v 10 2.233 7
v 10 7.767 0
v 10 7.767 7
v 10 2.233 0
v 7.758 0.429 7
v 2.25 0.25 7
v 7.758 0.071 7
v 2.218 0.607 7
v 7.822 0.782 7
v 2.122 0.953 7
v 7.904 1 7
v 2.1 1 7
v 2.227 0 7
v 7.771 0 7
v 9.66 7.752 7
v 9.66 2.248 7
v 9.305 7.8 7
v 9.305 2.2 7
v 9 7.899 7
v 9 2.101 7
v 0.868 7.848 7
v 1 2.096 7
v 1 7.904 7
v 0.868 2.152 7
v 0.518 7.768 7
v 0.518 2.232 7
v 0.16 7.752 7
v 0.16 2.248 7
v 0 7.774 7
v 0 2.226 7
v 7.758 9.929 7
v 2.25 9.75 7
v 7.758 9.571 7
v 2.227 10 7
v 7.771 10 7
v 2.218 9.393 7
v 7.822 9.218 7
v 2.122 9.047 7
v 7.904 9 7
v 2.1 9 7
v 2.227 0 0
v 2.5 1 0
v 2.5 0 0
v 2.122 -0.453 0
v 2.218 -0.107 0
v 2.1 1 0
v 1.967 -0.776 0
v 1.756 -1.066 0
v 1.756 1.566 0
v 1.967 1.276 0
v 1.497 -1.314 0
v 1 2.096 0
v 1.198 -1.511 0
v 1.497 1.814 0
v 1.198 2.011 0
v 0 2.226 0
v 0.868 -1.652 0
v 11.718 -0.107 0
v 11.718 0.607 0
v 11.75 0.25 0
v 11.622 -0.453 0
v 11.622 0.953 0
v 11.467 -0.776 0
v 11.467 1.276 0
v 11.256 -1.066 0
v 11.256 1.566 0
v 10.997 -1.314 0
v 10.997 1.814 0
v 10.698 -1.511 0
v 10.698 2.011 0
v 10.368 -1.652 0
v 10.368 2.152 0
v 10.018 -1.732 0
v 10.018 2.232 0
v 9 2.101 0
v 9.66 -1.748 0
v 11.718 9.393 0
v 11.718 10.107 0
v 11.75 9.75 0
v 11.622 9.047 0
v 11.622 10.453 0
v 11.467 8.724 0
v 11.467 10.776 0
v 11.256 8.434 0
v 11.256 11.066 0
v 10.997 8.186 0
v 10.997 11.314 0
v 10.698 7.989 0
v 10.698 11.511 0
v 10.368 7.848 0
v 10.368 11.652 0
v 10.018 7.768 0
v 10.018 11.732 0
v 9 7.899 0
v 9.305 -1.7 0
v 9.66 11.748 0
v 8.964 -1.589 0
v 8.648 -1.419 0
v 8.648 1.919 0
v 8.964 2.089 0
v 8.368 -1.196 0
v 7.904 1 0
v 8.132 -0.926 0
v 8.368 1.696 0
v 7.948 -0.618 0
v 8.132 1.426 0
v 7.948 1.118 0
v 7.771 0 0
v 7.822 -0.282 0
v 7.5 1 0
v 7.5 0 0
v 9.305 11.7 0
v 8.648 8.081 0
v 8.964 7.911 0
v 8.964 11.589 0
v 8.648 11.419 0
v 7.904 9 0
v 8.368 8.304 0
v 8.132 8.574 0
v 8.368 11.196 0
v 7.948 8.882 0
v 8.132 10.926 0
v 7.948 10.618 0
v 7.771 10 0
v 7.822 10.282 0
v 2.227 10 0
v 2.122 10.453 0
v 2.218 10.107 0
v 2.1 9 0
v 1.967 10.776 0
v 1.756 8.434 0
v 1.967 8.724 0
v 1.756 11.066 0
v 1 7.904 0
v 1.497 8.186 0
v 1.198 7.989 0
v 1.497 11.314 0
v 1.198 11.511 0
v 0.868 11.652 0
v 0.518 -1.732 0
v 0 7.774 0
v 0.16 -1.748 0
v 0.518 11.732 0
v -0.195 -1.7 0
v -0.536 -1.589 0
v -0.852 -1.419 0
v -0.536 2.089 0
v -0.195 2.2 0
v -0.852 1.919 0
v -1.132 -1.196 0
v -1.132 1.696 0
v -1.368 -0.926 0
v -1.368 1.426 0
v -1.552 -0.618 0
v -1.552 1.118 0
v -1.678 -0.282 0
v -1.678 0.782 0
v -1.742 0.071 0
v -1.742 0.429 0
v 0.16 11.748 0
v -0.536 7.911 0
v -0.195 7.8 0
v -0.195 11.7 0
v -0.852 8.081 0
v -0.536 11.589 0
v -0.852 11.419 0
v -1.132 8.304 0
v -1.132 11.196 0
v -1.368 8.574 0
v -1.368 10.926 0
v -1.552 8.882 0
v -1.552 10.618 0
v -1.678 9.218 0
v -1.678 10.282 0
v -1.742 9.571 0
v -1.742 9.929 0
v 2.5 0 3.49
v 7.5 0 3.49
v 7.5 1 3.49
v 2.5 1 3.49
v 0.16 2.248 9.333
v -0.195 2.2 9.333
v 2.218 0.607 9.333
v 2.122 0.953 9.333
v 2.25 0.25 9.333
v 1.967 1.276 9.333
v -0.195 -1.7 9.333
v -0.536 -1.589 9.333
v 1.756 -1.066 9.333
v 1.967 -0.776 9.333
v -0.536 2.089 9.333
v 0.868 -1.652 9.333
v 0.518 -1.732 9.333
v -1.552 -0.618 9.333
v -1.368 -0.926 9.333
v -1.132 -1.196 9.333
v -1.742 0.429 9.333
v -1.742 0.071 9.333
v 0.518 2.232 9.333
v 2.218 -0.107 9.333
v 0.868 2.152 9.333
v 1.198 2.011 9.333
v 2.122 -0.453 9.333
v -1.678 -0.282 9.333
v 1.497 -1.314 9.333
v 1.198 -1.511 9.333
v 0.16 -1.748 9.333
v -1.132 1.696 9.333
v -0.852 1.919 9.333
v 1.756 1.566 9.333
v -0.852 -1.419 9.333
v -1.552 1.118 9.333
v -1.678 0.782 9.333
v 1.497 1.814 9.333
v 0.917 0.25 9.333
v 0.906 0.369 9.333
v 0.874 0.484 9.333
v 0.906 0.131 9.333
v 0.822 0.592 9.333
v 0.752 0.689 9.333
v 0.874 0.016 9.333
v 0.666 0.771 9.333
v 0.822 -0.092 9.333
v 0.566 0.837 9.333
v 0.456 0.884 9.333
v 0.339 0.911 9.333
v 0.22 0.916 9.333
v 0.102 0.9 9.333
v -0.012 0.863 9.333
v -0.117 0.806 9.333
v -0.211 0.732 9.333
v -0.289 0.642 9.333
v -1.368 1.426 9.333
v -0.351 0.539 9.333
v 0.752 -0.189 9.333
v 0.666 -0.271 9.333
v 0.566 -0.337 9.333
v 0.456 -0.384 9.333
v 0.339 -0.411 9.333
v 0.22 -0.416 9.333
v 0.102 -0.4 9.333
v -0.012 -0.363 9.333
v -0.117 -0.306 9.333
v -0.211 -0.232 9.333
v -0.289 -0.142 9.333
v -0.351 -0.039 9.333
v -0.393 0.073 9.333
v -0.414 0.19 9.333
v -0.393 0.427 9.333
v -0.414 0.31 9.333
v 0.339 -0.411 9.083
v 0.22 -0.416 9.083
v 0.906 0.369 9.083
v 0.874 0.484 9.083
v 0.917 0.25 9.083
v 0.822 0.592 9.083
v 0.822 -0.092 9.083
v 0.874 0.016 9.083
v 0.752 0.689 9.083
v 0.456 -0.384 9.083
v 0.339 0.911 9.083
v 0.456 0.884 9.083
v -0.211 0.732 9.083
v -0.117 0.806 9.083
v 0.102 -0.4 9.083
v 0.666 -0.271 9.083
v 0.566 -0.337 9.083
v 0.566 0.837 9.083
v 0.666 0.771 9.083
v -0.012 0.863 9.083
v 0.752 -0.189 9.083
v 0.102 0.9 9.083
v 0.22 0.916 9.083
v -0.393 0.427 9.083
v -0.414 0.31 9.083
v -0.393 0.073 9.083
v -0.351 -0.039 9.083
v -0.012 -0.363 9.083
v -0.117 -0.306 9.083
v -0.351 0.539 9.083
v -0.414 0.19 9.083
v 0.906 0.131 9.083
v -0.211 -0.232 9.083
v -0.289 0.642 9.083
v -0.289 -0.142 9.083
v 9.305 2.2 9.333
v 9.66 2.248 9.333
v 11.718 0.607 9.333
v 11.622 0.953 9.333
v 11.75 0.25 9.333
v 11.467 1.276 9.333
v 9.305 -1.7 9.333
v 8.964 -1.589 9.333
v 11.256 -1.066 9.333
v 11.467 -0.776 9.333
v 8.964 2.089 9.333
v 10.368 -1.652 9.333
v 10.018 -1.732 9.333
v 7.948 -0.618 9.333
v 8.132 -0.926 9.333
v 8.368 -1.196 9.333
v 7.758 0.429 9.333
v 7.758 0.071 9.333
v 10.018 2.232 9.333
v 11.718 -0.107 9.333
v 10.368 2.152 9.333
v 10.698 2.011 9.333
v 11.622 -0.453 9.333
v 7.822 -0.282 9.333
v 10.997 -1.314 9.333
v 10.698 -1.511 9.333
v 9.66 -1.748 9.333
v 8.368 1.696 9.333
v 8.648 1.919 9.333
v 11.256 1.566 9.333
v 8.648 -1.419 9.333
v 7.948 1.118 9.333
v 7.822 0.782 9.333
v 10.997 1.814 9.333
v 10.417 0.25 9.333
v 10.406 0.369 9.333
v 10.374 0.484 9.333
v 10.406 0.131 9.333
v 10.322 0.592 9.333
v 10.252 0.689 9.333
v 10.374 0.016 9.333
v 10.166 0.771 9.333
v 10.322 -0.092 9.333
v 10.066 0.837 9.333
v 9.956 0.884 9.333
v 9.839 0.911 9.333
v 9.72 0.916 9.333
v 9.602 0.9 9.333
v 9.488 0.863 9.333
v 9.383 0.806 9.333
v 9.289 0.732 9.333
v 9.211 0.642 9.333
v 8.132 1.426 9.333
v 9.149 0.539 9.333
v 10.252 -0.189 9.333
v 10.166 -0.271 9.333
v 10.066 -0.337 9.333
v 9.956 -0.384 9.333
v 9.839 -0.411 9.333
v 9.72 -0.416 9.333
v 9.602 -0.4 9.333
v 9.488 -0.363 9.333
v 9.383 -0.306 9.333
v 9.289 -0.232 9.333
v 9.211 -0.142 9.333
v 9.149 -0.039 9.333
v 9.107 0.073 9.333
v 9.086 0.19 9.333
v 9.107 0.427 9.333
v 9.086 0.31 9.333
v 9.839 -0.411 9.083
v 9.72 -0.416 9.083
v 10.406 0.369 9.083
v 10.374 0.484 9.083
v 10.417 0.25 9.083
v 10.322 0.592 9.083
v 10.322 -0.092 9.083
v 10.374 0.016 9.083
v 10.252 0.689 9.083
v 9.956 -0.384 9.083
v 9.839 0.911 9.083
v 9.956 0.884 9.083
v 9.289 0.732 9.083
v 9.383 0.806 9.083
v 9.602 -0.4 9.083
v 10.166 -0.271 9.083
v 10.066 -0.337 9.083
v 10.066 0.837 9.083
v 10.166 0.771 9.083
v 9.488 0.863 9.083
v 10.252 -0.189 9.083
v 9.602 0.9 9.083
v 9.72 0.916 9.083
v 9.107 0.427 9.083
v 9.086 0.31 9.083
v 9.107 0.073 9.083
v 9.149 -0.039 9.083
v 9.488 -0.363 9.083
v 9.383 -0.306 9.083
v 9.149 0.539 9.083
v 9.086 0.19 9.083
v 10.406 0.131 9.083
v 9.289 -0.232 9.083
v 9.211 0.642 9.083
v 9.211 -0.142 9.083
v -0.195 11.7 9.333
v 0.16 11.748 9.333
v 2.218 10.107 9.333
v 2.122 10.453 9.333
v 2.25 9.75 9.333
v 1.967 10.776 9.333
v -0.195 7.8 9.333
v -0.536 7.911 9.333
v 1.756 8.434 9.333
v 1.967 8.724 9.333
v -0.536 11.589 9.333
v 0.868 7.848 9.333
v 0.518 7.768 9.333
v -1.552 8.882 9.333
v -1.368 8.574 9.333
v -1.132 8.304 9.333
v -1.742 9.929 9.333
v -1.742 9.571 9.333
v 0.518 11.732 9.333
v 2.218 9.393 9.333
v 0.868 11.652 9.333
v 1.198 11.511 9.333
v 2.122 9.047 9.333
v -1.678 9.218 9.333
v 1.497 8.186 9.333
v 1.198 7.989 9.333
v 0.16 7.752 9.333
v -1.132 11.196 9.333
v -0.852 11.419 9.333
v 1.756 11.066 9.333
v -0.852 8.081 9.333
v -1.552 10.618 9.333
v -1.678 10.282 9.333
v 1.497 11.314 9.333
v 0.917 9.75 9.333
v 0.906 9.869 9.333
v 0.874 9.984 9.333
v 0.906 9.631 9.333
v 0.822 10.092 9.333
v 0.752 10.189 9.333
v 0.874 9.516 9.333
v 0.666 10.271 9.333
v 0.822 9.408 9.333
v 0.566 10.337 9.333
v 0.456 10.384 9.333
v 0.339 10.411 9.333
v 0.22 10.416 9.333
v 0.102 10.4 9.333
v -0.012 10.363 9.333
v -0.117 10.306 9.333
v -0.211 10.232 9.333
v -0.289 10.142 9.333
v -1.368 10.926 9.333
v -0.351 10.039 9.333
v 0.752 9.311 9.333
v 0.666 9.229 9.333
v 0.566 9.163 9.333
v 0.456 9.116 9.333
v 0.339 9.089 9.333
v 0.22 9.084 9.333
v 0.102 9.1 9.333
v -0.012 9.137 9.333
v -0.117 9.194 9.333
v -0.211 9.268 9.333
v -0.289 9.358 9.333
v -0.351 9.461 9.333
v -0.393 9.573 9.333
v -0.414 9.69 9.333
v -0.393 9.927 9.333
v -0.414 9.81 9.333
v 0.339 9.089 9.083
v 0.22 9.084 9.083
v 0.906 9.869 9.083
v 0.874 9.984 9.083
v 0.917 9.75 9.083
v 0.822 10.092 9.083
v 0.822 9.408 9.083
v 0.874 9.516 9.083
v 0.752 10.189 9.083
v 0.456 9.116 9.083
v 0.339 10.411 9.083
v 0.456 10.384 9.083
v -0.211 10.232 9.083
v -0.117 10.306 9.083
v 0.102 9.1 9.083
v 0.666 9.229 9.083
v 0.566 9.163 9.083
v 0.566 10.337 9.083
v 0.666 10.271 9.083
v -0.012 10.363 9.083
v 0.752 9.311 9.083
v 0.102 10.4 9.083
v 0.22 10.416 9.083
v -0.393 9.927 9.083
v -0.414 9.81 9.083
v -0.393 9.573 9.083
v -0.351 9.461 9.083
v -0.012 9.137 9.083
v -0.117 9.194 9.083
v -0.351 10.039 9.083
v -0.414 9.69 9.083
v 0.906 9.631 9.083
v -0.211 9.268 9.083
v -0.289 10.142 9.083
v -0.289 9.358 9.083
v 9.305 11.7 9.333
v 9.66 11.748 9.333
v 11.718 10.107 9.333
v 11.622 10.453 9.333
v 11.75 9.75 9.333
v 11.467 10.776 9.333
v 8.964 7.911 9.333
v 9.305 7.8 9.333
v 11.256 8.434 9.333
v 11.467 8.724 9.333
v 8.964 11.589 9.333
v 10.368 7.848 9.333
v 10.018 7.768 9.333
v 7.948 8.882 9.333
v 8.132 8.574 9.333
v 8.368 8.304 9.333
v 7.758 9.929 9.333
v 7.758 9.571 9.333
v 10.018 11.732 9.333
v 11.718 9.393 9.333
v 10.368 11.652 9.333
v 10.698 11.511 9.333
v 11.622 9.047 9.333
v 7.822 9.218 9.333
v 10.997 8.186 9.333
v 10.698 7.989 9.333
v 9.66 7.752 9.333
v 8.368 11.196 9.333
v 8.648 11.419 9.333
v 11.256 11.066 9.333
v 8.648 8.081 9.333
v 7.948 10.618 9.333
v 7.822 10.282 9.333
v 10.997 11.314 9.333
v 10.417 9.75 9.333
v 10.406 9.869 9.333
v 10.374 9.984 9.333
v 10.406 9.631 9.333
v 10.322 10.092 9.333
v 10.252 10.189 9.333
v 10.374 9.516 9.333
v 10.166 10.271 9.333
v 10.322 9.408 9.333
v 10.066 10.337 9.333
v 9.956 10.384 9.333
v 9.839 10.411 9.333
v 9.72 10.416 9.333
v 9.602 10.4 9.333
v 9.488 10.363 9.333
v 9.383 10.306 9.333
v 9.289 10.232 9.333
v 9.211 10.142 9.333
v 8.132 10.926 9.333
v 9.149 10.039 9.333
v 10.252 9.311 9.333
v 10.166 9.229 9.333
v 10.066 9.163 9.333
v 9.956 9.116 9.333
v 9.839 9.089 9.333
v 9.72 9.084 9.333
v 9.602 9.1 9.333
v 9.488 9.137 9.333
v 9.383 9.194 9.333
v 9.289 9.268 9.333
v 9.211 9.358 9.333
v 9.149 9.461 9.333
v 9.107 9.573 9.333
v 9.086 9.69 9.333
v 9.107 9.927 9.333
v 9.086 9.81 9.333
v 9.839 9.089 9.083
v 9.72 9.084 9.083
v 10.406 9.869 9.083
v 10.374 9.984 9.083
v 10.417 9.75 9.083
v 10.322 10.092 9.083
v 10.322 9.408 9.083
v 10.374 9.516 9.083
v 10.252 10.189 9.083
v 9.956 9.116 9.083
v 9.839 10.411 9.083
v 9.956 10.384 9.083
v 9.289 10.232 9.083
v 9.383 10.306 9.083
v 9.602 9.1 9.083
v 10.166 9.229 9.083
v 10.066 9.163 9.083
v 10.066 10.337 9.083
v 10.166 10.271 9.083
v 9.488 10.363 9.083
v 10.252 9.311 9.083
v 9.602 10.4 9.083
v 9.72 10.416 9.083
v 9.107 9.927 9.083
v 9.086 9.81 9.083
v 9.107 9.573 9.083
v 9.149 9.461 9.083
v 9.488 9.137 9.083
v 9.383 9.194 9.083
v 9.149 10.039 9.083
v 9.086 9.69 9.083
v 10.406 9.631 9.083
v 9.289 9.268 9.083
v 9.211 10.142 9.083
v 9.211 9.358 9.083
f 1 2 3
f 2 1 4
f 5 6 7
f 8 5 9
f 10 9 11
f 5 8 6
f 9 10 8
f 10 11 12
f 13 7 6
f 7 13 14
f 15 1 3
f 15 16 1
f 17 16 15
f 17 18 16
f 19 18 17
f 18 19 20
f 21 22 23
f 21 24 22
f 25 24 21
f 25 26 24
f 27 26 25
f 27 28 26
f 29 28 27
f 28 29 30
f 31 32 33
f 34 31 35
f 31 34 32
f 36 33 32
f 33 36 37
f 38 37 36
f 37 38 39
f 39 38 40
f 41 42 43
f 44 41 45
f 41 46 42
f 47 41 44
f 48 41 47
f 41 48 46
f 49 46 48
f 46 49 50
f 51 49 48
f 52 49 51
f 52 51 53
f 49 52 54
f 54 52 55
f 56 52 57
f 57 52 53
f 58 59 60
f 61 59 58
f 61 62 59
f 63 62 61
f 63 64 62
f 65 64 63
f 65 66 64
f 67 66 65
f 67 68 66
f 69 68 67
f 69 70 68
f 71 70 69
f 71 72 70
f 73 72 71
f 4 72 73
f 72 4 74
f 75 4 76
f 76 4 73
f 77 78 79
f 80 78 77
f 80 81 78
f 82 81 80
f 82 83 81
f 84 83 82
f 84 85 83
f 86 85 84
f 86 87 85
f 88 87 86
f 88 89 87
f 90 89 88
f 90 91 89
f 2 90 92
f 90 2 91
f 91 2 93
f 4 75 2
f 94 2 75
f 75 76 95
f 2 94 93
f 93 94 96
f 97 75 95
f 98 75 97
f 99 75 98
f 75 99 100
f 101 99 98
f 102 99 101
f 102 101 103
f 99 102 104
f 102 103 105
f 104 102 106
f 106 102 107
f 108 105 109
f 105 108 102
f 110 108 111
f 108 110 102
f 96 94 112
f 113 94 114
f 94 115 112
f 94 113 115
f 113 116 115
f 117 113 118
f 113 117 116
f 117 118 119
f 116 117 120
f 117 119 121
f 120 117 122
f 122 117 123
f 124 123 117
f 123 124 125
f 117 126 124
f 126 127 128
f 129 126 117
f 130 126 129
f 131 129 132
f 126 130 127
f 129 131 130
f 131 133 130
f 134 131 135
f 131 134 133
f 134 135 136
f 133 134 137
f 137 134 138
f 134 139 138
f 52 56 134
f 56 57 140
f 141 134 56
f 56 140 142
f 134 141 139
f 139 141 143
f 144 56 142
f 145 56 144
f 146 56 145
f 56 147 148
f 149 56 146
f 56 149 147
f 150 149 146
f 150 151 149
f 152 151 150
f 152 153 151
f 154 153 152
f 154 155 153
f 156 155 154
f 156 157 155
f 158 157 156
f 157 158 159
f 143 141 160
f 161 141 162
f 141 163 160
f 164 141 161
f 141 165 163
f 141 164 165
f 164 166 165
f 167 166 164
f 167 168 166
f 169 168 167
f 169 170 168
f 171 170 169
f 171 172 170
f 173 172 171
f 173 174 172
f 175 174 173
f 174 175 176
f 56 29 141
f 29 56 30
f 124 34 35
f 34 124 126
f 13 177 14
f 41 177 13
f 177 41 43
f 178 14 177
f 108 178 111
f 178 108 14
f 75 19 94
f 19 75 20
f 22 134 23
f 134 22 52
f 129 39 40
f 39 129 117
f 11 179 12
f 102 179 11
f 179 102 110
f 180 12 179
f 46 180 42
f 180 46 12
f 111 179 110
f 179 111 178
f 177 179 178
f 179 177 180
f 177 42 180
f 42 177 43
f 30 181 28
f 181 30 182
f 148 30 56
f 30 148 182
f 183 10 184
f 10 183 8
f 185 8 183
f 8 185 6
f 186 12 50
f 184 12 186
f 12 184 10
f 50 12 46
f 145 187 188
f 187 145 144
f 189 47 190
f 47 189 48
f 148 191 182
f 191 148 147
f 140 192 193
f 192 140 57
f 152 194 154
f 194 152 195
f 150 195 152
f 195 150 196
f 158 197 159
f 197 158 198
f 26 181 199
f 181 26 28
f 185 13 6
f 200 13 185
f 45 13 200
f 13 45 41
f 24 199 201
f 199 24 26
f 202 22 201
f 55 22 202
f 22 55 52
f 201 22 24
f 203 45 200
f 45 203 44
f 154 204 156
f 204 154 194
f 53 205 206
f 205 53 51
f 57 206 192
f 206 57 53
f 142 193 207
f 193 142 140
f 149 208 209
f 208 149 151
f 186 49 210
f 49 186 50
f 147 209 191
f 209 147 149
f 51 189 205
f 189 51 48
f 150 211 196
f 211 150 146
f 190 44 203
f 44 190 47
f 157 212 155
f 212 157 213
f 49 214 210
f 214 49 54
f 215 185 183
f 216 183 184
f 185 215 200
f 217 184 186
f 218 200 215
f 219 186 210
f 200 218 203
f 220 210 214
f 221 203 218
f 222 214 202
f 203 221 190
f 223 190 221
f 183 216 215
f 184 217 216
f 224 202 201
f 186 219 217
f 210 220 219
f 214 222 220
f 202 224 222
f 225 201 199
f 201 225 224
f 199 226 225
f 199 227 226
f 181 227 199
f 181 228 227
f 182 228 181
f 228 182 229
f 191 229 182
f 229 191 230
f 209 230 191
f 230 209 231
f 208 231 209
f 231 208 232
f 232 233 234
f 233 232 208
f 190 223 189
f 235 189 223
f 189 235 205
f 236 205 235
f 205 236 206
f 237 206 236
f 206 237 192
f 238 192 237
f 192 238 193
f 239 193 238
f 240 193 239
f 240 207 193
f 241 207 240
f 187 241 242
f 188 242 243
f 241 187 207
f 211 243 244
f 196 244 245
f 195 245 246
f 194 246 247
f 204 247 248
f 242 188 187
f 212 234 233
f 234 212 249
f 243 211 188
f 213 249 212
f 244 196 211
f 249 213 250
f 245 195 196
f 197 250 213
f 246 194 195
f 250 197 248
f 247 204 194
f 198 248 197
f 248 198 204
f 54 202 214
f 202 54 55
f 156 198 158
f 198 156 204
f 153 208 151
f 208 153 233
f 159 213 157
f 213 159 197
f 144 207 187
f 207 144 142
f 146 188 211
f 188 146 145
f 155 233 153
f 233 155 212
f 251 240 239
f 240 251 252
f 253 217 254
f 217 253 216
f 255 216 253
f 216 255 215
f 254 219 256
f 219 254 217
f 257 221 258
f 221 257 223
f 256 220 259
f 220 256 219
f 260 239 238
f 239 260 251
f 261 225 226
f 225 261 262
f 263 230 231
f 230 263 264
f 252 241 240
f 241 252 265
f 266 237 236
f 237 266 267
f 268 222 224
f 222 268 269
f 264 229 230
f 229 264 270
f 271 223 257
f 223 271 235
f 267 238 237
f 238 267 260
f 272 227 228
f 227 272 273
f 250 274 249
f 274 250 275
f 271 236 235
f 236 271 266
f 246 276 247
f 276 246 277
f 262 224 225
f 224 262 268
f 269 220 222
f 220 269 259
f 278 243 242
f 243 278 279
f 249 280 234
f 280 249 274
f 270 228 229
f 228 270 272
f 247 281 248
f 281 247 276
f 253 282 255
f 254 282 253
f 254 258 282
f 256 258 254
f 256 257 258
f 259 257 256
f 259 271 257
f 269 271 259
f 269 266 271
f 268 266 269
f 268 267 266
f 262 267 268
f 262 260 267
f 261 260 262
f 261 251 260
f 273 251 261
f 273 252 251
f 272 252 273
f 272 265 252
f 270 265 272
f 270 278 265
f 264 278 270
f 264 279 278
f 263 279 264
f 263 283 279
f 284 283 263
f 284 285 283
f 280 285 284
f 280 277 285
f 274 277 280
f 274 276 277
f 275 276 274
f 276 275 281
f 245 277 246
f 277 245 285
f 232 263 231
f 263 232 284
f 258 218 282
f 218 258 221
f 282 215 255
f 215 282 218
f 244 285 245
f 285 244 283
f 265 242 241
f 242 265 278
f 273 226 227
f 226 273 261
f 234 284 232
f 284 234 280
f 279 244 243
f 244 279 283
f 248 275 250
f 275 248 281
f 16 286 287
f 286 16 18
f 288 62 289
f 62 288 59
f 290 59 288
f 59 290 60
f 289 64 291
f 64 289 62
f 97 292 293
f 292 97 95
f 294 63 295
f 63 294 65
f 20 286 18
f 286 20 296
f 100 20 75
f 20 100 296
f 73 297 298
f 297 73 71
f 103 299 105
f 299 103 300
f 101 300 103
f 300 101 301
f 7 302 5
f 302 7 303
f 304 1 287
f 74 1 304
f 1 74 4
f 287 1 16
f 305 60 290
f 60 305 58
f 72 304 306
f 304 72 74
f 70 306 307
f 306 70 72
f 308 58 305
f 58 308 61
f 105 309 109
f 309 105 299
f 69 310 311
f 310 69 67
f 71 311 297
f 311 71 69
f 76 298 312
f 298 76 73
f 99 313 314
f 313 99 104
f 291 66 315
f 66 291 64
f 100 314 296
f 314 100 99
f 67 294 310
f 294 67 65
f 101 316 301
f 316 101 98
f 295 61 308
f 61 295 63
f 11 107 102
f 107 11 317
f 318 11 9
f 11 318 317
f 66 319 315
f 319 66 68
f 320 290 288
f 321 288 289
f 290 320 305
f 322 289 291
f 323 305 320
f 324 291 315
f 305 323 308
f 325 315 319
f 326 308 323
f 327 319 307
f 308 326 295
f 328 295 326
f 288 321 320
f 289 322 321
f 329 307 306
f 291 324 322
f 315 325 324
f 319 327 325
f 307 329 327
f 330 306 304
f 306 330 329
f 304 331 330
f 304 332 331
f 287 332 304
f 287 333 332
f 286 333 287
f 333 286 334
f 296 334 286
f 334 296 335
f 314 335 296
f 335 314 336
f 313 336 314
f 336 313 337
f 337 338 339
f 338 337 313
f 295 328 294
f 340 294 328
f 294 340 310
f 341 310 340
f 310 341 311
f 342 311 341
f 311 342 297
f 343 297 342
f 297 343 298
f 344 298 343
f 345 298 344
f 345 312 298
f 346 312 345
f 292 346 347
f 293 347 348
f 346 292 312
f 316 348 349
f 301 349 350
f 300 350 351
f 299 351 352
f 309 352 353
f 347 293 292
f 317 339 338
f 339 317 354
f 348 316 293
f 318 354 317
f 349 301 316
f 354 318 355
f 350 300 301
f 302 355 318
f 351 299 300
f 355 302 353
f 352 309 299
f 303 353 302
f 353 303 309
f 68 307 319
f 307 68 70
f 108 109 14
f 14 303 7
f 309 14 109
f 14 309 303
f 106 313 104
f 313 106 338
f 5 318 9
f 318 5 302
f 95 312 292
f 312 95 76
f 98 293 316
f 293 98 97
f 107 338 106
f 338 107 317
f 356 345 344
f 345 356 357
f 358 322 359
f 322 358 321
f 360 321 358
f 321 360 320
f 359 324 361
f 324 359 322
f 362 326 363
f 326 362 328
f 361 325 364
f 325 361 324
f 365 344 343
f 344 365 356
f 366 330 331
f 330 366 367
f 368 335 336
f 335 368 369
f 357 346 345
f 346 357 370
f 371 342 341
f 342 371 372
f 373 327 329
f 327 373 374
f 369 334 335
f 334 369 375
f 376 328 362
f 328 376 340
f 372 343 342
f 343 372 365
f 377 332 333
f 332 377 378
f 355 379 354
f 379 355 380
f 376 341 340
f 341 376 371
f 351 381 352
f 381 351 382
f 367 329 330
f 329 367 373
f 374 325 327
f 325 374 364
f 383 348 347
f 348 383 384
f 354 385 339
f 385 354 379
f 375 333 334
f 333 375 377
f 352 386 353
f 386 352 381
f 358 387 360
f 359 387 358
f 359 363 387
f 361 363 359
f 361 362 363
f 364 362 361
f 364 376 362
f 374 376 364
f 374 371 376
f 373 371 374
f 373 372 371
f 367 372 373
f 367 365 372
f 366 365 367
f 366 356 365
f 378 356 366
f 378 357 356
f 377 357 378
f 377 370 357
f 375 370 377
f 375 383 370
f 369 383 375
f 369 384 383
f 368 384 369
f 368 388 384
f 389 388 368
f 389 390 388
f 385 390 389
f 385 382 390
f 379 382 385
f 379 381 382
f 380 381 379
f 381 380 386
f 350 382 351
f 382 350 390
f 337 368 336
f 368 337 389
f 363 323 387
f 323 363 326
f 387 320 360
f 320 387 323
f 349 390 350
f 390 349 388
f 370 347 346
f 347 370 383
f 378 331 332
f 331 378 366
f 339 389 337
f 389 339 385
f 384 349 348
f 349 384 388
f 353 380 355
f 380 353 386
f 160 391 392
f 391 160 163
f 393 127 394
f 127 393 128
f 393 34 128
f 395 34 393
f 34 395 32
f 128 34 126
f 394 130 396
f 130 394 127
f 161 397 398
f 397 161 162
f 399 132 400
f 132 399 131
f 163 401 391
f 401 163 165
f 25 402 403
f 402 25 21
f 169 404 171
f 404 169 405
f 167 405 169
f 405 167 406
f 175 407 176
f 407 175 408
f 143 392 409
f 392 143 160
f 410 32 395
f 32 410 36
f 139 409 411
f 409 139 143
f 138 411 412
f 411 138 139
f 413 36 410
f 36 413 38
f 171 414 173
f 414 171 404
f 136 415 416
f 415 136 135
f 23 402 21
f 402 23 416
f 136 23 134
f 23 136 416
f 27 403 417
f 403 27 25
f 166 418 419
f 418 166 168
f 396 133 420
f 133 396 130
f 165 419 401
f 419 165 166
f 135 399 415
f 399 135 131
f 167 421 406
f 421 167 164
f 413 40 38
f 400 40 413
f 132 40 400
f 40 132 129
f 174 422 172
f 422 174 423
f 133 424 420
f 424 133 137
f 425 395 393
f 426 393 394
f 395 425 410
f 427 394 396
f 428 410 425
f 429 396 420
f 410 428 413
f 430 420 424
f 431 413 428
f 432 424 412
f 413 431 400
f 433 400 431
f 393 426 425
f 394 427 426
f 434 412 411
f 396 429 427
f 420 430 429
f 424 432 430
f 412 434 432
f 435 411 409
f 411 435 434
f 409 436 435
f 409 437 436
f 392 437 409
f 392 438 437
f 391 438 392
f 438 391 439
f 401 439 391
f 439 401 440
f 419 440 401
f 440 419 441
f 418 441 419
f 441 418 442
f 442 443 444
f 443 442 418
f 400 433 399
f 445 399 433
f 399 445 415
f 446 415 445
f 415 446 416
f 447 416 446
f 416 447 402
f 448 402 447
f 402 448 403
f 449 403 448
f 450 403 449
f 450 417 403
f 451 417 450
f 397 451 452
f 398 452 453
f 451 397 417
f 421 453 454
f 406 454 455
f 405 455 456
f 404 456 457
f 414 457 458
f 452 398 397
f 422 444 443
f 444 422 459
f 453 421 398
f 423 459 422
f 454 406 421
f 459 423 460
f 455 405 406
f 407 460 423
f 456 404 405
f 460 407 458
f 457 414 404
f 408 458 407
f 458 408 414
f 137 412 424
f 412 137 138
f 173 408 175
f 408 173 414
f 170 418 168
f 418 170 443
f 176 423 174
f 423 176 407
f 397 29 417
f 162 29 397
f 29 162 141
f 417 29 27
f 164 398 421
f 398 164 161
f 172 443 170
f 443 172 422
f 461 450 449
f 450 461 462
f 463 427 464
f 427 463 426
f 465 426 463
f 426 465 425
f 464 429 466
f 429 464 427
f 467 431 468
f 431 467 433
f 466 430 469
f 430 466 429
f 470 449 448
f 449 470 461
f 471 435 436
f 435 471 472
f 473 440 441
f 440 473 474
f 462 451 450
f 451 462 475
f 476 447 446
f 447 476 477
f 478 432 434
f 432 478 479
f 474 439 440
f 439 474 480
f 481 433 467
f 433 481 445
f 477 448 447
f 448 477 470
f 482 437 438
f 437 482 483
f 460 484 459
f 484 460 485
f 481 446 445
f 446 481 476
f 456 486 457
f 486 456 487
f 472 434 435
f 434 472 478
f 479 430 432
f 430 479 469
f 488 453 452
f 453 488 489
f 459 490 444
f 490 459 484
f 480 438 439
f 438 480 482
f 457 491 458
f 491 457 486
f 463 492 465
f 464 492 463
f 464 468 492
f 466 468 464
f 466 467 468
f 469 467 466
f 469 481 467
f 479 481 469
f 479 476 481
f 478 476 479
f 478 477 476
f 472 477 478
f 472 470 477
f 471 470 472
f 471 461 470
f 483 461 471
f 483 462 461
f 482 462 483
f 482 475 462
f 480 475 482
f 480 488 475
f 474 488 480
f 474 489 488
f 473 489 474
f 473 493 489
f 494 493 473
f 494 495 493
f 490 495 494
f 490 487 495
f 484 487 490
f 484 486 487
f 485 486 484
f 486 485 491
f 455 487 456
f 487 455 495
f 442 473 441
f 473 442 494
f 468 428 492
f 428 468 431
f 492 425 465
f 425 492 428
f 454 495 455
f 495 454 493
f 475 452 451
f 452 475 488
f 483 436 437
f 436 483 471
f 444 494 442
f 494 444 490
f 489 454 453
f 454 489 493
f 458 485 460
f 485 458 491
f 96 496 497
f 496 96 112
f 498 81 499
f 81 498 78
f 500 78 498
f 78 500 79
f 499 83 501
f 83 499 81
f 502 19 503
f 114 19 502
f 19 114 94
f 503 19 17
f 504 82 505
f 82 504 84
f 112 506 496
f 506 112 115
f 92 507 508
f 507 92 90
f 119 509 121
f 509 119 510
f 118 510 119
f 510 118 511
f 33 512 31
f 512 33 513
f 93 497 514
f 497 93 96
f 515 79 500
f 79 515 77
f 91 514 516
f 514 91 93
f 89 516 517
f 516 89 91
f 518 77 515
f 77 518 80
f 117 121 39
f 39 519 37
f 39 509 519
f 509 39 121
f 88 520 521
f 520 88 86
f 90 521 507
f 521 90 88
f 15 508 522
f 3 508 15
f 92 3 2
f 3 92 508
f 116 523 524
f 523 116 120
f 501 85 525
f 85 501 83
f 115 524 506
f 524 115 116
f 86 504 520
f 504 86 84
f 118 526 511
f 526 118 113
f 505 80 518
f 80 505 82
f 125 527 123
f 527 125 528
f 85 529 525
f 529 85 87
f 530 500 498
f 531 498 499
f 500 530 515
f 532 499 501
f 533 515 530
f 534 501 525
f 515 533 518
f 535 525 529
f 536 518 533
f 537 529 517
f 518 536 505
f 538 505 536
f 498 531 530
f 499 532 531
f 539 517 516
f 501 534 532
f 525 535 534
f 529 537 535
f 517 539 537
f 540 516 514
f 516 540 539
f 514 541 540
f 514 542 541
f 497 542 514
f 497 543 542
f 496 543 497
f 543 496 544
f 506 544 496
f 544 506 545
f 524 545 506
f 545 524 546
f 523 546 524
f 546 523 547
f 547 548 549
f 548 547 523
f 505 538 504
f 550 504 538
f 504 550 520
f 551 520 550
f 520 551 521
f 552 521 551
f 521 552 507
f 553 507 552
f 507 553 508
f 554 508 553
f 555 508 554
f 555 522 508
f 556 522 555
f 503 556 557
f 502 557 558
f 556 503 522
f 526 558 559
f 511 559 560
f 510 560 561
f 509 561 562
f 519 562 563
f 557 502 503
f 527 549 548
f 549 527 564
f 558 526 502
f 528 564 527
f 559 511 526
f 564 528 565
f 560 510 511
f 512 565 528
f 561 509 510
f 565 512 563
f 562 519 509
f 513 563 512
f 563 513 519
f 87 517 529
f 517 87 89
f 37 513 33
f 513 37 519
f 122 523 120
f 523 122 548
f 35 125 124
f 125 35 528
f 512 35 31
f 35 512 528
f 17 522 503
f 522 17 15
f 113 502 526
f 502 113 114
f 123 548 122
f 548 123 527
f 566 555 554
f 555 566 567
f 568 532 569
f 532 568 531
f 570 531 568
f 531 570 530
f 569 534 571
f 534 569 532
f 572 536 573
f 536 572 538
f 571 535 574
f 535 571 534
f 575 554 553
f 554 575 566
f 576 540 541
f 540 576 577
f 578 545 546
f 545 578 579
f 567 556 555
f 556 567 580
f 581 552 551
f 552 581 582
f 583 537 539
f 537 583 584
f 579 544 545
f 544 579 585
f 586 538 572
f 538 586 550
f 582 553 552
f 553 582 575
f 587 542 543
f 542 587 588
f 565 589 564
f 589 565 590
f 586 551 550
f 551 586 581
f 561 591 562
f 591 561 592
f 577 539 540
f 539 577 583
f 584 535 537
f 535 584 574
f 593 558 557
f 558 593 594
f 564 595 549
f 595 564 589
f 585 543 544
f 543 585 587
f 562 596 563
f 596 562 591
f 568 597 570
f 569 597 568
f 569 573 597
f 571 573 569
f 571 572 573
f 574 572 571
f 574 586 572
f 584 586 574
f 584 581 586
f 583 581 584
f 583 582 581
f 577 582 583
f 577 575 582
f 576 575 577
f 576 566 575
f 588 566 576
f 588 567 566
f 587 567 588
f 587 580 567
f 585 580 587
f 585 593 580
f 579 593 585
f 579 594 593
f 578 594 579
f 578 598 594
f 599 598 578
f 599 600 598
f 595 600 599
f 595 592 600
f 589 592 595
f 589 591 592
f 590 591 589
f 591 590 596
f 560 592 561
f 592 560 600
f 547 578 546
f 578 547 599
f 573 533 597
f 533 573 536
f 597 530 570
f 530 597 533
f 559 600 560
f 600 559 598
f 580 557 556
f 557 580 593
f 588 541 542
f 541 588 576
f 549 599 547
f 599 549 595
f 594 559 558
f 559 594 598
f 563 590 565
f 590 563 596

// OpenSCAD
// Variables //
wall_length = 10;
wall_height = 7;
wall_thickness = 1;

// Calculated Variables //
tower_height = wall_height + wall_height/3;
tower_radius = wall_thickness*2;
parapet_height = wall_thickness/4;

// A single Tower as a reusable module //
module tower(){
	difference(){
		difference(){
			cylinder(
				tower_height,
				tower_radius,
				tower_radius,
				$fn=35); //Main Tower

			translate([
				0,
				0,
				tower_height - parapet_height
			])
			cylinder(
				parapet_height +1,
				wall_thickness/1.5,
				wall_thickness/1.5,
				$fn=35); // Hole in top of tower
		}
	
	}
}

// Objects //

difference() {
	// Main Walls //
	difference() {
		cube([
				wall_length,
				wall_length,
				wall_height]);
			translate([
				wall_thickness,
				wall_thickness,
				-wall_thickness
			])
			cube([
				wall_length - wall_thickness*2,
				wall_length - wall_thickness*2,
				wall_length + wall_thickness*2
			]);
	}

// The Main Door //
	translate([
		wall_length/4,
		-1,
		-.01
	])
	cube([
		wall_length/2,
		wall_thickness+2,
		wall_height/2
	]);
}

// Towers //
translate([
	wall_thickness/4,
	wall_thickness/4,
	0
]) tower();

translate([
	wall_length - wall_thickness/4,
	wall_thickness/4,
	0
	]) tower();

translate([
	wall_thickness/4,
	wall_length - wall_thickness/4,
	0]) tower();

translate([
	wall_length - wall_thickness/4,
	wall_length - wall_thickness/4,
	0]) tower();
